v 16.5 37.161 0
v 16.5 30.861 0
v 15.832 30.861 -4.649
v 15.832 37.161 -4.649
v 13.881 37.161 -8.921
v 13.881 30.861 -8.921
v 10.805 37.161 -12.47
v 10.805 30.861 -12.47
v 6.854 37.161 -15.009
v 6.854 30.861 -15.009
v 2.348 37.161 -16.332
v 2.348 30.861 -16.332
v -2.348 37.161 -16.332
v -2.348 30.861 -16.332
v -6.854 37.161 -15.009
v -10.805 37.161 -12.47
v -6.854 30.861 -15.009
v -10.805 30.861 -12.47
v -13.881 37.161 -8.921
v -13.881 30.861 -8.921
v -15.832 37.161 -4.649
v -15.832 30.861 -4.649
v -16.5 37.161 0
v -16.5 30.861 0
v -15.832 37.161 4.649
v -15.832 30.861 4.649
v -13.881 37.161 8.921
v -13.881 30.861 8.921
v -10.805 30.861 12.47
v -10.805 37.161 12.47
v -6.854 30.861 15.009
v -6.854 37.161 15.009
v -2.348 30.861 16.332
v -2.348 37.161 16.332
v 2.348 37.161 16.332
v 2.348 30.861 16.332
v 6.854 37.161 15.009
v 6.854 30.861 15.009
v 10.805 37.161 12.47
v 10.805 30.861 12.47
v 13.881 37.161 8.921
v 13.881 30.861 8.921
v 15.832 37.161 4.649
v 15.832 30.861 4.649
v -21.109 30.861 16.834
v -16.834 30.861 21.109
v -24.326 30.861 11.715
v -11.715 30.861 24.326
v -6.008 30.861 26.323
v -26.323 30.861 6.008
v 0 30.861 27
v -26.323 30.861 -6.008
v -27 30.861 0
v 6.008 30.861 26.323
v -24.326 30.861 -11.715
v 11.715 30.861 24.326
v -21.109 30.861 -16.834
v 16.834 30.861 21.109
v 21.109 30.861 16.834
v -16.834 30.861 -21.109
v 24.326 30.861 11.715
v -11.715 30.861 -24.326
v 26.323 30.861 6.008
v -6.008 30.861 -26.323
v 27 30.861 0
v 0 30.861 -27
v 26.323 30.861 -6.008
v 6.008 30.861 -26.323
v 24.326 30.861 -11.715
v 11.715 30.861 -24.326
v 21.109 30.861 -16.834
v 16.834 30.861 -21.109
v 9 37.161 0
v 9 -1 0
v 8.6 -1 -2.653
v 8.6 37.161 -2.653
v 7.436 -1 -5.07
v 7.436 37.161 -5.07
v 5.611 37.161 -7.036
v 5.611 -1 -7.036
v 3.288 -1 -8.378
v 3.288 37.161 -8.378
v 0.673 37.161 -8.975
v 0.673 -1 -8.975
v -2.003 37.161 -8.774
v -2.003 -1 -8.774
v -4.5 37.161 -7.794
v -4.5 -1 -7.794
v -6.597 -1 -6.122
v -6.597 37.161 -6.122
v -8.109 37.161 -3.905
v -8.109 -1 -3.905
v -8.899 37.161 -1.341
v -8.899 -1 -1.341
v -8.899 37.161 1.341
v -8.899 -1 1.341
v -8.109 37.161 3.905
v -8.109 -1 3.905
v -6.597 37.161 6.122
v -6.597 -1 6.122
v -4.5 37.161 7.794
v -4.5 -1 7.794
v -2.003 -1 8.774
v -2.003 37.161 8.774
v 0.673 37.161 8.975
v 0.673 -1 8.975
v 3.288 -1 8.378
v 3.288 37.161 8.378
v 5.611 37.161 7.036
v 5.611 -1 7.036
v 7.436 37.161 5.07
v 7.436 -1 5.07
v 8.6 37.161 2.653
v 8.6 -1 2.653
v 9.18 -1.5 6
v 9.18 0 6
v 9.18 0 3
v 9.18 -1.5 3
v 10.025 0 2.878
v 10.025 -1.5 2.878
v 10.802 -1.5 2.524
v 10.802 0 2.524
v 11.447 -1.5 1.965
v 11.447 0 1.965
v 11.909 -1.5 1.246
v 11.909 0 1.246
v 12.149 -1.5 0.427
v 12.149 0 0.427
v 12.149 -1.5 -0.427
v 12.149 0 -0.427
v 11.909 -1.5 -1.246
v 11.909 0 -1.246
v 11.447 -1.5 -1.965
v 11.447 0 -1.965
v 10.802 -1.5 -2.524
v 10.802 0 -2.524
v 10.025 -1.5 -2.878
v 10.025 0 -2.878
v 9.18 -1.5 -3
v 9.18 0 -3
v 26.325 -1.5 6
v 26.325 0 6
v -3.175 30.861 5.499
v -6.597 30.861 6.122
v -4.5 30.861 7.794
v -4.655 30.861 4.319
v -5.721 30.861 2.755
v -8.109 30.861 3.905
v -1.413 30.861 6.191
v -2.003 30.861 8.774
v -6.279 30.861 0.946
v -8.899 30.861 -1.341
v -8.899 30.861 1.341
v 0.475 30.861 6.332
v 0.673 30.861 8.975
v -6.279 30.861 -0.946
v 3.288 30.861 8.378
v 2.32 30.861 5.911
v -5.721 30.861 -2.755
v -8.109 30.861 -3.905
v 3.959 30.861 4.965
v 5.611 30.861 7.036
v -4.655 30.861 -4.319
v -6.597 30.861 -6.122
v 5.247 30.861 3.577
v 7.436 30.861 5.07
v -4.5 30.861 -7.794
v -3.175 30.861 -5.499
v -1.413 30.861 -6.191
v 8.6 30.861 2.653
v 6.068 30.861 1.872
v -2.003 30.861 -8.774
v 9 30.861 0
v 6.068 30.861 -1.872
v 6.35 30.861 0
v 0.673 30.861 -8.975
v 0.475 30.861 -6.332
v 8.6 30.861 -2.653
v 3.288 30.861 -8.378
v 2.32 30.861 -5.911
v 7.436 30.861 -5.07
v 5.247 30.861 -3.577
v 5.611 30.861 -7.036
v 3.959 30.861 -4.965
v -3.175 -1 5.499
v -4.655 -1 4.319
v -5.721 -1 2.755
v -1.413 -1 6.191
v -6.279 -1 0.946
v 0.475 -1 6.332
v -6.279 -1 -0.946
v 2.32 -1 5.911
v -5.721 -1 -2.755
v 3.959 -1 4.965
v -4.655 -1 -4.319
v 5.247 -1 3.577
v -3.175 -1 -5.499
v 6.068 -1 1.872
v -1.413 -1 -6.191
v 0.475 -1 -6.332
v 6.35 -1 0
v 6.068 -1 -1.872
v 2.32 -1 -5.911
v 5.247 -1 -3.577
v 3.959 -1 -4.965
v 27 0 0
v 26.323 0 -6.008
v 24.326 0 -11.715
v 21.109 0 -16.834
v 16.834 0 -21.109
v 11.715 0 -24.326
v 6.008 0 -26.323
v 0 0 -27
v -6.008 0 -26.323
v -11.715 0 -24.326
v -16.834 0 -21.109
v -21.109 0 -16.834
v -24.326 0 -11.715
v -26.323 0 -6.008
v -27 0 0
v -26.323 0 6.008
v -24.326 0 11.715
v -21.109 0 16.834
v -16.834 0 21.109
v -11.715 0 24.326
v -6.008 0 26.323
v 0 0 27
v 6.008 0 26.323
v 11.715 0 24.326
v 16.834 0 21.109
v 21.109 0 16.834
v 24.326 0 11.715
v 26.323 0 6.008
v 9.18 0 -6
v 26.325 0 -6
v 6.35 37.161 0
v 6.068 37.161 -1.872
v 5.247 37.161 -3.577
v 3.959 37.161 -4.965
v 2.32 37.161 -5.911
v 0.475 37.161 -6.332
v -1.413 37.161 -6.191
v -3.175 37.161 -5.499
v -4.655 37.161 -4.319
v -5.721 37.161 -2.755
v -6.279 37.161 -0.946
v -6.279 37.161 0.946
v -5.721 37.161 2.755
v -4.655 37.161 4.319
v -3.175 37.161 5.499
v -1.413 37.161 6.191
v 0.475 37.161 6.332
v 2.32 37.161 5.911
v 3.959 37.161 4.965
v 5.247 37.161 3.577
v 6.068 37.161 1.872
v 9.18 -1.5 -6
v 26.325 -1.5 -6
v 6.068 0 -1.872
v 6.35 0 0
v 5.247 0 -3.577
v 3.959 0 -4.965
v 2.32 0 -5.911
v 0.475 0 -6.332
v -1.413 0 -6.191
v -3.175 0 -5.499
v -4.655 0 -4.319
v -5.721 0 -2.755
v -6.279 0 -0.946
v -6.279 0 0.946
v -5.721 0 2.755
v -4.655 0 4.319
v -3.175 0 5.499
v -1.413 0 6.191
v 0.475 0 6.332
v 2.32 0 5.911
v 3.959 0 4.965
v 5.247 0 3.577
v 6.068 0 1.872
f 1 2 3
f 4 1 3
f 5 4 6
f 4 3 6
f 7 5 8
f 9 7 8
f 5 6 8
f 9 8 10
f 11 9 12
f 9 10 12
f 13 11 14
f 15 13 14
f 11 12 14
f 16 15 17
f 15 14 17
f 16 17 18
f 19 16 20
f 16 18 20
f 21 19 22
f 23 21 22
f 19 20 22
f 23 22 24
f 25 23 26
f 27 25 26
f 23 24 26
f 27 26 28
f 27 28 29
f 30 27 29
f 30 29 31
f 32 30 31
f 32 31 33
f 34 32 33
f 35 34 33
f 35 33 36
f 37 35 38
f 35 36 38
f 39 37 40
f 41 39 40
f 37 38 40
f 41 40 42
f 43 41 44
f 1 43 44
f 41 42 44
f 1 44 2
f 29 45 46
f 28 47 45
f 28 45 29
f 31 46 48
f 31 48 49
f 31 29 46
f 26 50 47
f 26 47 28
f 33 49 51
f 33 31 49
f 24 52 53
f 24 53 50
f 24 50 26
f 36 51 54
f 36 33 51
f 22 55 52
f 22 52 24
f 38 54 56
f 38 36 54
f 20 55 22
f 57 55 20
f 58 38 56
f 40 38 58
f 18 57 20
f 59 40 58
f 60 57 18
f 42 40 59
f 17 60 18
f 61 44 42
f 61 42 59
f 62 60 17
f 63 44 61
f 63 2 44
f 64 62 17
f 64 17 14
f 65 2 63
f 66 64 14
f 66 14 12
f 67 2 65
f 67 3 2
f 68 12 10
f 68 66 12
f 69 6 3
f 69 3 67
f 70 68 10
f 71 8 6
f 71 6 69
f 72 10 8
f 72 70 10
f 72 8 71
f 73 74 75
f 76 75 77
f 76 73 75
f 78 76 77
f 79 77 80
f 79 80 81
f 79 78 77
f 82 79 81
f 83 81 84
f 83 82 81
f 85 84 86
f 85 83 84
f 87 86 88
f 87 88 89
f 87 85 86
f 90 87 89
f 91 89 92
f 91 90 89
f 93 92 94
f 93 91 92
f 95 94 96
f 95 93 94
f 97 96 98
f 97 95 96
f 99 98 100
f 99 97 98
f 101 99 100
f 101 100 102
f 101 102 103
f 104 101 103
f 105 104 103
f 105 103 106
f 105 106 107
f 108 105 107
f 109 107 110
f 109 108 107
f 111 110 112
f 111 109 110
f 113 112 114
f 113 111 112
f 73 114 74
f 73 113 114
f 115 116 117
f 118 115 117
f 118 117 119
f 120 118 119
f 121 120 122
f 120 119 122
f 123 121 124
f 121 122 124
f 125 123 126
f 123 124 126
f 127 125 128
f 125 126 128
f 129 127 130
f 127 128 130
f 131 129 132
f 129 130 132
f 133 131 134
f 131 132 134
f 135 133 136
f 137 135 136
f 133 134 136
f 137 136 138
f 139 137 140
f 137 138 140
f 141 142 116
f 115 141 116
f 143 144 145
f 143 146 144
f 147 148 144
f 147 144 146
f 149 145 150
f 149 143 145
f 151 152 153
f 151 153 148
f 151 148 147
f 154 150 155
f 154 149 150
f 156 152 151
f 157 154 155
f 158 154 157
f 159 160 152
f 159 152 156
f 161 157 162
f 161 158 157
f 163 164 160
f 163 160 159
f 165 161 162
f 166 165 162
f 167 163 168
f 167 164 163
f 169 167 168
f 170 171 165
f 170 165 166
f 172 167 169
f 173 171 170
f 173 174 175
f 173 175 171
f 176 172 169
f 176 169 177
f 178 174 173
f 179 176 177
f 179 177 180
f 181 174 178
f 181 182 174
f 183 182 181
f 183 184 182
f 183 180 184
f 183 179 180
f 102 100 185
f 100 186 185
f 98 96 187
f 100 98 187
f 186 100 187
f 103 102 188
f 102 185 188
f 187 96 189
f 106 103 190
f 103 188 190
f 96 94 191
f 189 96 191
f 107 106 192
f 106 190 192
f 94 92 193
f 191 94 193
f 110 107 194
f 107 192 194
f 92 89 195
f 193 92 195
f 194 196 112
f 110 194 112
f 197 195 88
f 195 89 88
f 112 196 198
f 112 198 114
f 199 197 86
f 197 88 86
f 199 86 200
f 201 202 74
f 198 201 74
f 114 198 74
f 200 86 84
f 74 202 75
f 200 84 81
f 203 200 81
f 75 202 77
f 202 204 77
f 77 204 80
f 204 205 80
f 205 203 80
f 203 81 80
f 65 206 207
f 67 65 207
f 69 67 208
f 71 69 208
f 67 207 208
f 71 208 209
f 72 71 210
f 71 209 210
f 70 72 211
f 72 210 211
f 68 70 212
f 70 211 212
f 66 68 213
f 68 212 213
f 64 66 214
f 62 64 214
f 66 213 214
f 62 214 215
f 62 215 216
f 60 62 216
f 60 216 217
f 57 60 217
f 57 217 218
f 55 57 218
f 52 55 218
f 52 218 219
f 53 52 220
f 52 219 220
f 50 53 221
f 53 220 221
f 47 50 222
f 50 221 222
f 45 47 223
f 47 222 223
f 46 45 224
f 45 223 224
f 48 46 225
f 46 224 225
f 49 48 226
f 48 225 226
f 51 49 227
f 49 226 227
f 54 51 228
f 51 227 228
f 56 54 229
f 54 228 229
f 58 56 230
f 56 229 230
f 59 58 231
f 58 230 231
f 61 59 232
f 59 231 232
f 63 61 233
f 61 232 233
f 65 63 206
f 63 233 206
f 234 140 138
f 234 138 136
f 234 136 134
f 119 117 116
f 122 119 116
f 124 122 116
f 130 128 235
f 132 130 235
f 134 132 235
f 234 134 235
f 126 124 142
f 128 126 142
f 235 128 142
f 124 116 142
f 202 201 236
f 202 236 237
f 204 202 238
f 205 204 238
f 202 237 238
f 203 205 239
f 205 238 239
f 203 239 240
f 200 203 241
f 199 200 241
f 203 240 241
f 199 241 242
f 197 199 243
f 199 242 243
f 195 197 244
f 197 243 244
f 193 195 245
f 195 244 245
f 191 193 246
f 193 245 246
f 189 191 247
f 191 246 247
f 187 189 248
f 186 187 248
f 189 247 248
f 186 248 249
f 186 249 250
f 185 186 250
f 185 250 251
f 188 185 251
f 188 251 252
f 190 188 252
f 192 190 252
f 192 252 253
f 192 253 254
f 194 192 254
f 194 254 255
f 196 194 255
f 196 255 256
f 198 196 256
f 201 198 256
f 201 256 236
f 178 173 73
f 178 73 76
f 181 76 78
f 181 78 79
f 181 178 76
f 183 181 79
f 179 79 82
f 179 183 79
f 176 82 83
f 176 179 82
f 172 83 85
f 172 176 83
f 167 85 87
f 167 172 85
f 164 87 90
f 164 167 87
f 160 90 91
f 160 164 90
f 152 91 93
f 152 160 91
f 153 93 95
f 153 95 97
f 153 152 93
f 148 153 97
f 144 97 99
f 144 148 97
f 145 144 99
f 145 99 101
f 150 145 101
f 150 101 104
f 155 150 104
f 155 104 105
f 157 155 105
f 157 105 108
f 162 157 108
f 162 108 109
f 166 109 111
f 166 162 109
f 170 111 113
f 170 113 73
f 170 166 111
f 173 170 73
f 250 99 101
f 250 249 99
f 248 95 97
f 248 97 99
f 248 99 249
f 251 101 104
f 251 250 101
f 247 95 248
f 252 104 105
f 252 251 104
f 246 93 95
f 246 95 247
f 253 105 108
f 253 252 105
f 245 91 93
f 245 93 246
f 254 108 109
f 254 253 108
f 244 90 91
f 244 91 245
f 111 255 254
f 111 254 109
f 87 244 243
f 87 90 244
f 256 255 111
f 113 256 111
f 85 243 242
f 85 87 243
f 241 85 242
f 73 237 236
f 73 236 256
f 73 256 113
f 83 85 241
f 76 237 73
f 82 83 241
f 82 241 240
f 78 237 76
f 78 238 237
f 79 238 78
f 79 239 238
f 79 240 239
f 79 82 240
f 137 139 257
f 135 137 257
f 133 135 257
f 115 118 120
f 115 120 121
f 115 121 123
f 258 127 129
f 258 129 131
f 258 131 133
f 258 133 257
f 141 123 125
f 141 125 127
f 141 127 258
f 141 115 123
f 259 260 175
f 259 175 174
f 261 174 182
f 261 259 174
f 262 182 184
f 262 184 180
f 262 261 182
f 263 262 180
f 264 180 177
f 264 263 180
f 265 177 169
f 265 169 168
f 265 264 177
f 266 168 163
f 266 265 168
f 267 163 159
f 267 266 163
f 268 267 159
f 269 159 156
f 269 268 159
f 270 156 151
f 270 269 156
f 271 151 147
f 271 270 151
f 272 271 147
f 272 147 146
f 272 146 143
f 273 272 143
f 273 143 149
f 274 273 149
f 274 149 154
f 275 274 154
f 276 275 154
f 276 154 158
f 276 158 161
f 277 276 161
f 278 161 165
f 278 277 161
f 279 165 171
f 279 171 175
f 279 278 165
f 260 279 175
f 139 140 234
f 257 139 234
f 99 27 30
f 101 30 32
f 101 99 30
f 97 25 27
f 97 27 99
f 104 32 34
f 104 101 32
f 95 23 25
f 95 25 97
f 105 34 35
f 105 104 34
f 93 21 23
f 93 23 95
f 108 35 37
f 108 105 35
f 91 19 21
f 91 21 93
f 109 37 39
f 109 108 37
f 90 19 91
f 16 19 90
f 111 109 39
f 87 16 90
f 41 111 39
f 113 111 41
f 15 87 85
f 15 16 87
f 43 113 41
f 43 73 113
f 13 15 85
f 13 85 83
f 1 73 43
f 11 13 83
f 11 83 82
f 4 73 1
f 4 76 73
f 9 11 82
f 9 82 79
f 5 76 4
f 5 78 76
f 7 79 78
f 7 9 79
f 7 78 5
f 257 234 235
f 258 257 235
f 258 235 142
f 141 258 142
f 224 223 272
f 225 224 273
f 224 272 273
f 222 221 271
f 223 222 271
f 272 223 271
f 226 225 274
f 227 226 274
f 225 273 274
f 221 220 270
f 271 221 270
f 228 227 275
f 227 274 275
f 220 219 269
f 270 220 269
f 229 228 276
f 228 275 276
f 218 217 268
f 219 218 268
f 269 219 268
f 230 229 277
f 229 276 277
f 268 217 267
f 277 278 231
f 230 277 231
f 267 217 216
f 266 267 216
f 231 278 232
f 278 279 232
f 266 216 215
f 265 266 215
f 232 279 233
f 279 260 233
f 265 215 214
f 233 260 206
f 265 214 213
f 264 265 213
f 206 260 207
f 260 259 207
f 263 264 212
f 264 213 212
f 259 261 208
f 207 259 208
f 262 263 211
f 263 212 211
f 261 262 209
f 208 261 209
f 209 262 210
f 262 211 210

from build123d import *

# Parameters (mm, degrees)
SKETCH2_R                = 27
SKETCH2_R_2              = 6.35
BOSS_EXTRUDE1_DEPTH      = 30.861
SKETCH3_R                = 16.5
SKETCH3_R_2              = 9
BOSS_EXTRUDE2_DEPTH      = 6.3
SKETCH4_R                = 9
BOSS_EXTRUDE3_DEPTH      = 6.3
BOSS_EXTRUDE3_DEPTH_BACK = 31.861
SKETCH5_R                = 6.35
CUT_EXTRUDE1_DEPTH       = 39.161
BOSS_EXTRUDE4_DEPTH      = 1.5


with BuildPart() as part:
    # Sketch2 → Boss-Extrude1 (new body)
    with BuildSketch(Plane(origin=(0, 0, 0), x_dir=(1, 0, 0), z_dir=(0, 1, 0))):
        Circle(SKETCH2_R)
        Circle(SKETCH2_R_2, mode=Mode.SUBTRACT)
    extrude(amount=BOSS_EXTRUDE1_DEPTH)

    # Sketch3 → Boss-Extrude2 (add)
    with BuildSketch(Plane(origin=(0, 30.861, 0), x_dir=(1, 0, 0), z_dir=(0, 1, 0))):
        Circle(SKETCH3_R)
        Circle(SKETCH3_R_2, mode=Mode.SUBTRACT)
    extrude(amount=BOSS_EXTRUDE2_DEPTH)


with BuildPart() as body_2:
    # Sketch4 → Boss-Extrude3 (new body, two sides)
    with BuildSketch(Plane(origin=(0, 30.861, 0), x_dir=(1, 0, 0), z_dir=(0, 1, 0))) as boss_extrude3_sk:
        Circle(SKETCH4_R)
    extrude(amount=BOSS_EXTRUDE3_DEPTH)
    extrude(boss_extrude3_sk.sketch, amount=-BOSS_EXTRUDE3_DEPTH_BACK)

    # Sketch5 → Cut-Extrude1 (cut, through all)
    with BuildSketch(Plane(origin=(0, 37.161, 0), x_dir=(1, 0, 0), z_dir=(0, 1, 0))):
        Circle(SKETCH5_R)
    extrude(amount=-CUT_EXTRUDE1_DEPTH, mode=Mode.SUBTRACT)


with BuildPart() as body_3:
    # Sketch6 → Boss-Extrude4 (new body)
    with BuildSketch(Plane.XZ):
        with BuildLine():
            Line((26.324893162, -6), (26.324893162, 6))
            Line((26.324893162, 6), (9.179893162, 6))
            Line((9.179893162, 6), (9.179893162, 3))
            ThreePointArc((9.179893162, 3), (12.179893162, 0), (9.179893162, -3))
            Line((9.179893162, -3), (9.179893162, -6))
            Line((9.179893162, -6), (26.324893162, -6))
        make_face()
    extrude(amount=BOSS_EXTRUDE4_DEPTH)


solid = Compound([part.part, body_2.part, body_3.part])
